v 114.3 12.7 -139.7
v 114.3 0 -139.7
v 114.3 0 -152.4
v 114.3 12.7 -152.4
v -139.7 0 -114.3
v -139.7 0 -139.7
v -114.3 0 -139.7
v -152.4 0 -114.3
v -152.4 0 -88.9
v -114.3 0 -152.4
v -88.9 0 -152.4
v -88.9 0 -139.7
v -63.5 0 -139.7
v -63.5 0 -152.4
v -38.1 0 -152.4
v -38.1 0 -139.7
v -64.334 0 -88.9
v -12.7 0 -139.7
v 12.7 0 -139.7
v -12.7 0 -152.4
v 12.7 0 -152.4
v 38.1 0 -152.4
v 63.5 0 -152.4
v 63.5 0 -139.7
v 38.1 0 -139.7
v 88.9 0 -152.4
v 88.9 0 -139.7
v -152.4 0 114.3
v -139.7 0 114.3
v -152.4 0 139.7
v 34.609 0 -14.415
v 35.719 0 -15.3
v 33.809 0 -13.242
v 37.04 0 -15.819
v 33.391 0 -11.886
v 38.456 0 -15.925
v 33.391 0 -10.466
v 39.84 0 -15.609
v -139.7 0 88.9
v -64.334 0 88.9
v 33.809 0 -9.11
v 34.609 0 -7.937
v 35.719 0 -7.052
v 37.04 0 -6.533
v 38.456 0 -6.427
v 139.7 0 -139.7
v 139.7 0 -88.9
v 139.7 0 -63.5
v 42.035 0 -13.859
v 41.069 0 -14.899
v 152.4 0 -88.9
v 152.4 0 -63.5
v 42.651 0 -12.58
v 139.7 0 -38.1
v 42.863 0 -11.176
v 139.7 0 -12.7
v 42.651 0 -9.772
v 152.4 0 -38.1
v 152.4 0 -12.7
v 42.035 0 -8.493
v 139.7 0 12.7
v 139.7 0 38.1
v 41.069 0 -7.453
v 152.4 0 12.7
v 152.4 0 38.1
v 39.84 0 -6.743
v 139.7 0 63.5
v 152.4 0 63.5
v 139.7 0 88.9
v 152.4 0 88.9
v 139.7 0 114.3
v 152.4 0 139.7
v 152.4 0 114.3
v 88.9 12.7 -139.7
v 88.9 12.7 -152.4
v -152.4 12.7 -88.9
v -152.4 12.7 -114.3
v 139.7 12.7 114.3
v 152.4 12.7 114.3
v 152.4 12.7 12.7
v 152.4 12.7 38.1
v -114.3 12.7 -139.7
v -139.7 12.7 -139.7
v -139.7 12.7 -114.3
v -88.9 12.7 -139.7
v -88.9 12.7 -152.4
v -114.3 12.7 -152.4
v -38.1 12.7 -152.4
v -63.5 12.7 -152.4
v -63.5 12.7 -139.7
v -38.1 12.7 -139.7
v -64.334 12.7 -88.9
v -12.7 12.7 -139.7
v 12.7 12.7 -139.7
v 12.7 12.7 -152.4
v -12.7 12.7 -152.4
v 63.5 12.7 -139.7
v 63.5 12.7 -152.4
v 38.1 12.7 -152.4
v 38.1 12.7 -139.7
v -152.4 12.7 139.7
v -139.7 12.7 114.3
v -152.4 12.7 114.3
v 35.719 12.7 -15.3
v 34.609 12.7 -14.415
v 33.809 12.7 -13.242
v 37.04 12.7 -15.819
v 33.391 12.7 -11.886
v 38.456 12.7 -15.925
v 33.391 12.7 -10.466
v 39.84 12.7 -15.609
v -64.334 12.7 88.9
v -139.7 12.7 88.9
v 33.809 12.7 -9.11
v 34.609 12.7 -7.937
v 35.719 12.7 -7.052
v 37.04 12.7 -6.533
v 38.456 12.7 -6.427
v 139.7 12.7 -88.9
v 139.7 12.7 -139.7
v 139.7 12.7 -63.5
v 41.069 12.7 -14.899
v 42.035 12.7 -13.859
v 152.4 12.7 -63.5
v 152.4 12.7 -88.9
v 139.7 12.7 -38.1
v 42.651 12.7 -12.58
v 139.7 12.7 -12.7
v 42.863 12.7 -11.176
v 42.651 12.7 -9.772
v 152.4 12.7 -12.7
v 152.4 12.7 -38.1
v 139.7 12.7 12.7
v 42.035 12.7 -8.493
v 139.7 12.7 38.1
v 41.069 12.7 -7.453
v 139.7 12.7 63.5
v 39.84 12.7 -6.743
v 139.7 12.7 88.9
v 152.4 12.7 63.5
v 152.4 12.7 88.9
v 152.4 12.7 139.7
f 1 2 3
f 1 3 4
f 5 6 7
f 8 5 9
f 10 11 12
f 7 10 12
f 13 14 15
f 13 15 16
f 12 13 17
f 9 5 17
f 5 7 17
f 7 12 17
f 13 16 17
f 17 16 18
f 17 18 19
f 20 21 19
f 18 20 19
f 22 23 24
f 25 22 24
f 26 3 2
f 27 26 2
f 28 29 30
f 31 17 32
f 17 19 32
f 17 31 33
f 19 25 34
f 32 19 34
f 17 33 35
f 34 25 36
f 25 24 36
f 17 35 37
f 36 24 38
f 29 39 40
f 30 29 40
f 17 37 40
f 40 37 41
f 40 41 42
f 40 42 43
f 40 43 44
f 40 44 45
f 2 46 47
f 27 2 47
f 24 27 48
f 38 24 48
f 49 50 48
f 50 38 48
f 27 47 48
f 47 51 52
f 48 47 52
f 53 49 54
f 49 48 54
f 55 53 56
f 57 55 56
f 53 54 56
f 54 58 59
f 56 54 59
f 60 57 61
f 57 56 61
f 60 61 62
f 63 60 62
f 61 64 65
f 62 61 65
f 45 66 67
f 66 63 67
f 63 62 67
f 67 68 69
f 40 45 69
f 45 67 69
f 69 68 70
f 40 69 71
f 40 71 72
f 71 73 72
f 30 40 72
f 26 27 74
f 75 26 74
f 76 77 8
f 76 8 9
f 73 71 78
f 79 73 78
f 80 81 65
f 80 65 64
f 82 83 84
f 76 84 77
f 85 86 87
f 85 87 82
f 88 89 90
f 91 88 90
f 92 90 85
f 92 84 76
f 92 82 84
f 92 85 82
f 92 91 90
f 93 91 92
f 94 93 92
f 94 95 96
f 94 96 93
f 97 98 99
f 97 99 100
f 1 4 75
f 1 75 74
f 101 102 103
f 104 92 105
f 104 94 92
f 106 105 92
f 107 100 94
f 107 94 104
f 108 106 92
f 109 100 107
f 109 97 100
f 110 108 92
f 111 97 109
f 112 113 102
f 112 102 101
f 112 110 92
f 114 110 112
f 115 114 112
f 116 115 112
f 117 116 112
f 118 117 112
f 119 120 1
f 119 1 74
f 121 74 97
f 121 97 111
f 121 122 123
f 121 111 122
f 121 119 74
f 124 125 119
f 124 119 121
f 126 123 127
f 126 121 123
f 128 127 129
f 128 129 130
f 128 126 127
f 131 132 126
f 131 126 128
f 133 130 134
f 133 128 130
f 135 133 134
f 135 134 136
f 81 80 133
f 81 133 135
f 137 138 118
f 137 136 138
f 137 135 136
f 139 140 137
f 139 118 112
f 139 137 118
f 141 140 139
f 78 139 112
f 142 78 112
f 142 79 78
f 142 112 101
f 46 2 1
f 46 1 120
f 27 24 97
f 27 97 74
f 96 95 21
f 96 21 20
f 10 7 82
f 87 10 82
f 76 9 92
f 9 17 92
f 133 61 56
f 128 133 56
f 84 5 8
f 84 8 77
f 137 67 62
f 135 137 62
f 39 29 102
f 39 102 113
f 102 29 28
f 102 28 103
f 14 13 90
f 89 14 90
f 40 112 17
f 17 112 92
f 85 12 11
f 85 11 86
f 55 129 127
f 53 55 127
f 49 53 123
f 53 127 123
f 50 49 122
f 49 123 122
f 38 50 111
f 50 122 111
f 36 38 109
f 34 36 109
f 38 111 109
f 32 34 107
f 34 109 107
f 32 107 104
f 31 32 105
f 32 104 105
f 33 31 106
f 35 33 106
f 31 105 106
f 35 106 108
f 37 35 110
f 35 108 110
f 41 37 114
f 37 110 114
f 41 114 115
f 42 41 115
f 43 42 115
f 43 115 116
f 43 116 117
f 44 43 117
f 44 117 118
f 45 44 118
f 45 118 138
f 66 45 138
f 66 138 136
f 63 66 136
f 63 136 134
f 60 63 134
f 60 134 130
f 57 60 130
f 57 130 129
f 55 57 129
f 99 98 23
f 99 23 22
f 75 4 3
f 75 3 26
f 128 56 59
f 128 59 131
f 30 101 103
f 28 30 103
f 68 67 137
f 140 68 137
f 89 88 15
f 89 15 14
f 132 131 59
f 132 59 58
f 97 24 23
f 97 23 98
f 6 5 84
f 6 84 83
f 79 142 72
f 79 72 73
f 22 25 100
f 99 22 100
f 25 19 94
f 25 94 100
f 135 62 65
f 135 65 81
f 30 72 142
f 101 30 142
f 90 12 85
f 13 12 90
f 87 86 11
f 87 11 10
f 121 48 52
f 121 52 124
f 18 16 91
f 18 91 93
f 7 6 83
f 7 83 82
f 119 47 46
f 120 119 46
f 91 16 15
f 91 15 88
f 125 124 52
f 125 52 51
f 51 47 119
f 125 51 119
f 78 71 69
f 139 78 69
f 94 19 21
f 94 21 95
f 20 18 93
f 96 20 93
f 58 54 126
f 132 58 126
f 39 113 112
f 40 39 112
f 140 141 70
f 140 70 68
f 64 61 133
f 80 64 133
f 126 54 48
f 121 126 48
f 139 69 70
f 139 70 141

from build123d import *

# Parameters (mm, degrees)
SKETCH1_W               = 279.4
SKETCH1_H               = 279.4
BOSS_EXTRUDE1_DEPTH     = 12.7
SKETCH2_W               = 25.4
SKETCH2_H               = 12.7
BOSS_EXTRUDE2_DEPTH     = 12.7
LPATTERN1_COUNT         = 5
LPATTERN1_PITCH         = 50.8
MIRROR1_COPY_1_SKETCH_W = 25.4
MIRROR1_COPY_1_SKETCH_H = 12.7
MIRROR1_COPY_1_DEPTH    = 12.7
MIRROR1_COPY_2_SKETCH_W = 25.4
MIRROR1_COPY_2_SKETCH_H = 12.7
MIRROR1_COPY_2_DEPTH    = 12.7
MIRROR1_COPY_3_SKETCH_W = 25.4
MIRROR1_COPY_3_SKETCH_H = 12.7
MIRROR1_COPY_3_DEPTH    = 12.7
MIRROR1_COPY_4_SKETCH_W = 25.4
MIRROR1_COPY_4_SKETCH_H = 12.7
MIRROR1_COPY_4_DEPTH    = 12.7
SKETCH3_W               = 25.4
SKETCH3_H               = 12.7
BOSS_EXTRUDE3_DEPTH     = 12.7
LPATTERN2_COUNT         = 5
LPATTERN2_PITCH         = 50.8
SKETCH6_R               = 4.7625
CUT_EXTRUDE1_DEPTH      = 13.7
SKETCH8_W               = 88.066093183
SKETCH8_H               = 177.8
CUT_EXTRUDE3_DEPTH      = 13.7
SKETCH9_W               = 25.4
SKETCH9_H               = 12.7
BOSS_EXTRUDE4_DEPTH     = 12.7


with BuildPart() as part:
    # Sketch1 → Boss-Extrude1 (new body)
    with BuildSketch(Plane(origin=(0, 0, 0), x_dir=(1, 0, 0), z_dir=(0, 1, 0))):
        Rectangle(SKETCH1_W, SKETCH1_H)
    extrude(amount=BOSS_EXTRUDE1_DEPTH)

    # Sketch2 → Boss-Extrude2 (add)
    with BuildSketch(Plane(origin=(139.7, 0, 0), x_dir=(0, 0, -1), z_dir=(1, 0, 0))):
        with Locations((-127, 6.35)):
            Rectangle(SKETCH2_W, SKETCH2_H)
    boss_extrude2 = extrude(amount=BOSS_EXTRUDE2_DEPTH)

    # LPattern1: Boss-Extrude2 ×5
    with Locations(*[(0, 0, -i * LPATTERN1_PITCH) for i in range(1, LPATTERN1_COUNT)]):
        add(boss_extrude2)

    # Mirror1: Boss-Extrude2 across plane
    add(boss_extrude2.mirror(Plane(origin=(0, 0, 0), x_dir=(0, 0, 1), z_dir=(1, 0, 0))))

    # Mirror1 copy 1 sketch → Mirror1 copy 1 (add)
    with BuildSketch(Plane(origin=(-139.7, 0, -50.8), x_dir=(0, 0, -1), z_dir=(-1, 0, 0))):
        with Locations((-127, -6.35)):
            Rectangle(MIRROR1_COPY_1_SKETCH_W, MIRROR1_COPY_1_SKETCH_H)
    extrude(amount=MIRROR1_COPY_1_DEPTH)

    # Mirror1 copy 2 sketch → Mirror1 copy 2 (add)
    with BuildSketch(Plane(origin=(-139.7, 0, -101.6), x_dir=(0, 0, -1), z_dir=(-1, 0, 0))):
        with Locations((-127, -6.35)):
            Rectangle(MIRROR1_COPY_2_SKETCH_W, MIRROR1_COPY_2_SKETCH_H)
    extrude(amount=MIRROR1_COPY_2_DEPTH)

    # Mirror1 copy 3 sketch → Mirror1 copy 3 (add)
    with BuildSketch(Plane(origin=(-139.7, 0, -152.4), x_dir=(0, 0, -1), z_dir=(-1, 0, 0))):
        with Locations((-127, -6.35)):
            Rectangle(MIRROR1_COPY_3_SKETCH_W, MIRROR1_COPY_3_SKETCH_H)
    extrude(amount=MIRROR1_COPY_3_DEPTH)

    # Mirror1 copy 4 sketch → Mirror1 copy 4 (add)
    with BuildSketch(Plane(origin=(-139.7, 0, -203.2), x_dir=(0, 0, -1), z_dir=(-1, 0, 0))):
        with Locations((-127, -6.35)):
            Rectangle(MIRROR1_COPY_4_SKETCH_W, MIRROR1_COPY_4_SKETCH_H)
    extrude(amount=MIRROR1_COPY_4_DEPTH)

    # Sketch3 → Boss-Extrude3 (add)
    with BuildSketch(Plane(origin=(0, 0, -139.7), x_dir=(-1, 0, 0), z_dir=(0, 0, -1))):
        with Locations((-101.6, 6.35)):
            Rectangle(SKETCH3_W, SKETCH3_H)
    boss_extrude3 = extrude(amount=BOSS_EXTRUDE3_DEPTH)

    # LPattern2: Boss-Extrude3 ×5
    with Locations(*[(-i * LPATTERN2_PITCH, 0, 0) for i in range(1, LPATTERN2_COUNT)]):
        add(boss_extrude3)

    # Sketch6 → Cut-Extrude1 (cut, through all)
    with BuildSketch(Plane(origin=(0, 12.7, 0), x_dir=(1, 0, 0), z_dir=(0, 1, 0))):
        with Locations((38.1, 11.176)):
            Circle(SKETCH6_R)
    extrude(amount=-CUT_EXTRUDE1_DEPTH, mode=Mode.SUBTRACT)

    # Sketch8 → Cut-Extrude3 (cut, through all)
    with BuildSketch(Plane(origin=(0, 12.7, 0), x_dir=(1, 0, 0), z_dir=(0, 1, 0))):
        with Locations((-108.366953408, 0)):
            Rectangle(SKETCH8_W, SKETCH8_H)
    extrude(amount=-CUT_EXTRUDE3_DEPTH, mode=Mode.SUBTRACT)

    # Sketch9 → Boss-Extrude4 (add)
    with BuildSketch(Plane.ZY.offset(139.7)):
        with Locations((-101.6, 6.35)):
            Rectangle(SKETCH9_W, SKETCH9_H)
    extrude(amount=BOSS_EXTRUDE4_DEPTH)


solid = part.part
